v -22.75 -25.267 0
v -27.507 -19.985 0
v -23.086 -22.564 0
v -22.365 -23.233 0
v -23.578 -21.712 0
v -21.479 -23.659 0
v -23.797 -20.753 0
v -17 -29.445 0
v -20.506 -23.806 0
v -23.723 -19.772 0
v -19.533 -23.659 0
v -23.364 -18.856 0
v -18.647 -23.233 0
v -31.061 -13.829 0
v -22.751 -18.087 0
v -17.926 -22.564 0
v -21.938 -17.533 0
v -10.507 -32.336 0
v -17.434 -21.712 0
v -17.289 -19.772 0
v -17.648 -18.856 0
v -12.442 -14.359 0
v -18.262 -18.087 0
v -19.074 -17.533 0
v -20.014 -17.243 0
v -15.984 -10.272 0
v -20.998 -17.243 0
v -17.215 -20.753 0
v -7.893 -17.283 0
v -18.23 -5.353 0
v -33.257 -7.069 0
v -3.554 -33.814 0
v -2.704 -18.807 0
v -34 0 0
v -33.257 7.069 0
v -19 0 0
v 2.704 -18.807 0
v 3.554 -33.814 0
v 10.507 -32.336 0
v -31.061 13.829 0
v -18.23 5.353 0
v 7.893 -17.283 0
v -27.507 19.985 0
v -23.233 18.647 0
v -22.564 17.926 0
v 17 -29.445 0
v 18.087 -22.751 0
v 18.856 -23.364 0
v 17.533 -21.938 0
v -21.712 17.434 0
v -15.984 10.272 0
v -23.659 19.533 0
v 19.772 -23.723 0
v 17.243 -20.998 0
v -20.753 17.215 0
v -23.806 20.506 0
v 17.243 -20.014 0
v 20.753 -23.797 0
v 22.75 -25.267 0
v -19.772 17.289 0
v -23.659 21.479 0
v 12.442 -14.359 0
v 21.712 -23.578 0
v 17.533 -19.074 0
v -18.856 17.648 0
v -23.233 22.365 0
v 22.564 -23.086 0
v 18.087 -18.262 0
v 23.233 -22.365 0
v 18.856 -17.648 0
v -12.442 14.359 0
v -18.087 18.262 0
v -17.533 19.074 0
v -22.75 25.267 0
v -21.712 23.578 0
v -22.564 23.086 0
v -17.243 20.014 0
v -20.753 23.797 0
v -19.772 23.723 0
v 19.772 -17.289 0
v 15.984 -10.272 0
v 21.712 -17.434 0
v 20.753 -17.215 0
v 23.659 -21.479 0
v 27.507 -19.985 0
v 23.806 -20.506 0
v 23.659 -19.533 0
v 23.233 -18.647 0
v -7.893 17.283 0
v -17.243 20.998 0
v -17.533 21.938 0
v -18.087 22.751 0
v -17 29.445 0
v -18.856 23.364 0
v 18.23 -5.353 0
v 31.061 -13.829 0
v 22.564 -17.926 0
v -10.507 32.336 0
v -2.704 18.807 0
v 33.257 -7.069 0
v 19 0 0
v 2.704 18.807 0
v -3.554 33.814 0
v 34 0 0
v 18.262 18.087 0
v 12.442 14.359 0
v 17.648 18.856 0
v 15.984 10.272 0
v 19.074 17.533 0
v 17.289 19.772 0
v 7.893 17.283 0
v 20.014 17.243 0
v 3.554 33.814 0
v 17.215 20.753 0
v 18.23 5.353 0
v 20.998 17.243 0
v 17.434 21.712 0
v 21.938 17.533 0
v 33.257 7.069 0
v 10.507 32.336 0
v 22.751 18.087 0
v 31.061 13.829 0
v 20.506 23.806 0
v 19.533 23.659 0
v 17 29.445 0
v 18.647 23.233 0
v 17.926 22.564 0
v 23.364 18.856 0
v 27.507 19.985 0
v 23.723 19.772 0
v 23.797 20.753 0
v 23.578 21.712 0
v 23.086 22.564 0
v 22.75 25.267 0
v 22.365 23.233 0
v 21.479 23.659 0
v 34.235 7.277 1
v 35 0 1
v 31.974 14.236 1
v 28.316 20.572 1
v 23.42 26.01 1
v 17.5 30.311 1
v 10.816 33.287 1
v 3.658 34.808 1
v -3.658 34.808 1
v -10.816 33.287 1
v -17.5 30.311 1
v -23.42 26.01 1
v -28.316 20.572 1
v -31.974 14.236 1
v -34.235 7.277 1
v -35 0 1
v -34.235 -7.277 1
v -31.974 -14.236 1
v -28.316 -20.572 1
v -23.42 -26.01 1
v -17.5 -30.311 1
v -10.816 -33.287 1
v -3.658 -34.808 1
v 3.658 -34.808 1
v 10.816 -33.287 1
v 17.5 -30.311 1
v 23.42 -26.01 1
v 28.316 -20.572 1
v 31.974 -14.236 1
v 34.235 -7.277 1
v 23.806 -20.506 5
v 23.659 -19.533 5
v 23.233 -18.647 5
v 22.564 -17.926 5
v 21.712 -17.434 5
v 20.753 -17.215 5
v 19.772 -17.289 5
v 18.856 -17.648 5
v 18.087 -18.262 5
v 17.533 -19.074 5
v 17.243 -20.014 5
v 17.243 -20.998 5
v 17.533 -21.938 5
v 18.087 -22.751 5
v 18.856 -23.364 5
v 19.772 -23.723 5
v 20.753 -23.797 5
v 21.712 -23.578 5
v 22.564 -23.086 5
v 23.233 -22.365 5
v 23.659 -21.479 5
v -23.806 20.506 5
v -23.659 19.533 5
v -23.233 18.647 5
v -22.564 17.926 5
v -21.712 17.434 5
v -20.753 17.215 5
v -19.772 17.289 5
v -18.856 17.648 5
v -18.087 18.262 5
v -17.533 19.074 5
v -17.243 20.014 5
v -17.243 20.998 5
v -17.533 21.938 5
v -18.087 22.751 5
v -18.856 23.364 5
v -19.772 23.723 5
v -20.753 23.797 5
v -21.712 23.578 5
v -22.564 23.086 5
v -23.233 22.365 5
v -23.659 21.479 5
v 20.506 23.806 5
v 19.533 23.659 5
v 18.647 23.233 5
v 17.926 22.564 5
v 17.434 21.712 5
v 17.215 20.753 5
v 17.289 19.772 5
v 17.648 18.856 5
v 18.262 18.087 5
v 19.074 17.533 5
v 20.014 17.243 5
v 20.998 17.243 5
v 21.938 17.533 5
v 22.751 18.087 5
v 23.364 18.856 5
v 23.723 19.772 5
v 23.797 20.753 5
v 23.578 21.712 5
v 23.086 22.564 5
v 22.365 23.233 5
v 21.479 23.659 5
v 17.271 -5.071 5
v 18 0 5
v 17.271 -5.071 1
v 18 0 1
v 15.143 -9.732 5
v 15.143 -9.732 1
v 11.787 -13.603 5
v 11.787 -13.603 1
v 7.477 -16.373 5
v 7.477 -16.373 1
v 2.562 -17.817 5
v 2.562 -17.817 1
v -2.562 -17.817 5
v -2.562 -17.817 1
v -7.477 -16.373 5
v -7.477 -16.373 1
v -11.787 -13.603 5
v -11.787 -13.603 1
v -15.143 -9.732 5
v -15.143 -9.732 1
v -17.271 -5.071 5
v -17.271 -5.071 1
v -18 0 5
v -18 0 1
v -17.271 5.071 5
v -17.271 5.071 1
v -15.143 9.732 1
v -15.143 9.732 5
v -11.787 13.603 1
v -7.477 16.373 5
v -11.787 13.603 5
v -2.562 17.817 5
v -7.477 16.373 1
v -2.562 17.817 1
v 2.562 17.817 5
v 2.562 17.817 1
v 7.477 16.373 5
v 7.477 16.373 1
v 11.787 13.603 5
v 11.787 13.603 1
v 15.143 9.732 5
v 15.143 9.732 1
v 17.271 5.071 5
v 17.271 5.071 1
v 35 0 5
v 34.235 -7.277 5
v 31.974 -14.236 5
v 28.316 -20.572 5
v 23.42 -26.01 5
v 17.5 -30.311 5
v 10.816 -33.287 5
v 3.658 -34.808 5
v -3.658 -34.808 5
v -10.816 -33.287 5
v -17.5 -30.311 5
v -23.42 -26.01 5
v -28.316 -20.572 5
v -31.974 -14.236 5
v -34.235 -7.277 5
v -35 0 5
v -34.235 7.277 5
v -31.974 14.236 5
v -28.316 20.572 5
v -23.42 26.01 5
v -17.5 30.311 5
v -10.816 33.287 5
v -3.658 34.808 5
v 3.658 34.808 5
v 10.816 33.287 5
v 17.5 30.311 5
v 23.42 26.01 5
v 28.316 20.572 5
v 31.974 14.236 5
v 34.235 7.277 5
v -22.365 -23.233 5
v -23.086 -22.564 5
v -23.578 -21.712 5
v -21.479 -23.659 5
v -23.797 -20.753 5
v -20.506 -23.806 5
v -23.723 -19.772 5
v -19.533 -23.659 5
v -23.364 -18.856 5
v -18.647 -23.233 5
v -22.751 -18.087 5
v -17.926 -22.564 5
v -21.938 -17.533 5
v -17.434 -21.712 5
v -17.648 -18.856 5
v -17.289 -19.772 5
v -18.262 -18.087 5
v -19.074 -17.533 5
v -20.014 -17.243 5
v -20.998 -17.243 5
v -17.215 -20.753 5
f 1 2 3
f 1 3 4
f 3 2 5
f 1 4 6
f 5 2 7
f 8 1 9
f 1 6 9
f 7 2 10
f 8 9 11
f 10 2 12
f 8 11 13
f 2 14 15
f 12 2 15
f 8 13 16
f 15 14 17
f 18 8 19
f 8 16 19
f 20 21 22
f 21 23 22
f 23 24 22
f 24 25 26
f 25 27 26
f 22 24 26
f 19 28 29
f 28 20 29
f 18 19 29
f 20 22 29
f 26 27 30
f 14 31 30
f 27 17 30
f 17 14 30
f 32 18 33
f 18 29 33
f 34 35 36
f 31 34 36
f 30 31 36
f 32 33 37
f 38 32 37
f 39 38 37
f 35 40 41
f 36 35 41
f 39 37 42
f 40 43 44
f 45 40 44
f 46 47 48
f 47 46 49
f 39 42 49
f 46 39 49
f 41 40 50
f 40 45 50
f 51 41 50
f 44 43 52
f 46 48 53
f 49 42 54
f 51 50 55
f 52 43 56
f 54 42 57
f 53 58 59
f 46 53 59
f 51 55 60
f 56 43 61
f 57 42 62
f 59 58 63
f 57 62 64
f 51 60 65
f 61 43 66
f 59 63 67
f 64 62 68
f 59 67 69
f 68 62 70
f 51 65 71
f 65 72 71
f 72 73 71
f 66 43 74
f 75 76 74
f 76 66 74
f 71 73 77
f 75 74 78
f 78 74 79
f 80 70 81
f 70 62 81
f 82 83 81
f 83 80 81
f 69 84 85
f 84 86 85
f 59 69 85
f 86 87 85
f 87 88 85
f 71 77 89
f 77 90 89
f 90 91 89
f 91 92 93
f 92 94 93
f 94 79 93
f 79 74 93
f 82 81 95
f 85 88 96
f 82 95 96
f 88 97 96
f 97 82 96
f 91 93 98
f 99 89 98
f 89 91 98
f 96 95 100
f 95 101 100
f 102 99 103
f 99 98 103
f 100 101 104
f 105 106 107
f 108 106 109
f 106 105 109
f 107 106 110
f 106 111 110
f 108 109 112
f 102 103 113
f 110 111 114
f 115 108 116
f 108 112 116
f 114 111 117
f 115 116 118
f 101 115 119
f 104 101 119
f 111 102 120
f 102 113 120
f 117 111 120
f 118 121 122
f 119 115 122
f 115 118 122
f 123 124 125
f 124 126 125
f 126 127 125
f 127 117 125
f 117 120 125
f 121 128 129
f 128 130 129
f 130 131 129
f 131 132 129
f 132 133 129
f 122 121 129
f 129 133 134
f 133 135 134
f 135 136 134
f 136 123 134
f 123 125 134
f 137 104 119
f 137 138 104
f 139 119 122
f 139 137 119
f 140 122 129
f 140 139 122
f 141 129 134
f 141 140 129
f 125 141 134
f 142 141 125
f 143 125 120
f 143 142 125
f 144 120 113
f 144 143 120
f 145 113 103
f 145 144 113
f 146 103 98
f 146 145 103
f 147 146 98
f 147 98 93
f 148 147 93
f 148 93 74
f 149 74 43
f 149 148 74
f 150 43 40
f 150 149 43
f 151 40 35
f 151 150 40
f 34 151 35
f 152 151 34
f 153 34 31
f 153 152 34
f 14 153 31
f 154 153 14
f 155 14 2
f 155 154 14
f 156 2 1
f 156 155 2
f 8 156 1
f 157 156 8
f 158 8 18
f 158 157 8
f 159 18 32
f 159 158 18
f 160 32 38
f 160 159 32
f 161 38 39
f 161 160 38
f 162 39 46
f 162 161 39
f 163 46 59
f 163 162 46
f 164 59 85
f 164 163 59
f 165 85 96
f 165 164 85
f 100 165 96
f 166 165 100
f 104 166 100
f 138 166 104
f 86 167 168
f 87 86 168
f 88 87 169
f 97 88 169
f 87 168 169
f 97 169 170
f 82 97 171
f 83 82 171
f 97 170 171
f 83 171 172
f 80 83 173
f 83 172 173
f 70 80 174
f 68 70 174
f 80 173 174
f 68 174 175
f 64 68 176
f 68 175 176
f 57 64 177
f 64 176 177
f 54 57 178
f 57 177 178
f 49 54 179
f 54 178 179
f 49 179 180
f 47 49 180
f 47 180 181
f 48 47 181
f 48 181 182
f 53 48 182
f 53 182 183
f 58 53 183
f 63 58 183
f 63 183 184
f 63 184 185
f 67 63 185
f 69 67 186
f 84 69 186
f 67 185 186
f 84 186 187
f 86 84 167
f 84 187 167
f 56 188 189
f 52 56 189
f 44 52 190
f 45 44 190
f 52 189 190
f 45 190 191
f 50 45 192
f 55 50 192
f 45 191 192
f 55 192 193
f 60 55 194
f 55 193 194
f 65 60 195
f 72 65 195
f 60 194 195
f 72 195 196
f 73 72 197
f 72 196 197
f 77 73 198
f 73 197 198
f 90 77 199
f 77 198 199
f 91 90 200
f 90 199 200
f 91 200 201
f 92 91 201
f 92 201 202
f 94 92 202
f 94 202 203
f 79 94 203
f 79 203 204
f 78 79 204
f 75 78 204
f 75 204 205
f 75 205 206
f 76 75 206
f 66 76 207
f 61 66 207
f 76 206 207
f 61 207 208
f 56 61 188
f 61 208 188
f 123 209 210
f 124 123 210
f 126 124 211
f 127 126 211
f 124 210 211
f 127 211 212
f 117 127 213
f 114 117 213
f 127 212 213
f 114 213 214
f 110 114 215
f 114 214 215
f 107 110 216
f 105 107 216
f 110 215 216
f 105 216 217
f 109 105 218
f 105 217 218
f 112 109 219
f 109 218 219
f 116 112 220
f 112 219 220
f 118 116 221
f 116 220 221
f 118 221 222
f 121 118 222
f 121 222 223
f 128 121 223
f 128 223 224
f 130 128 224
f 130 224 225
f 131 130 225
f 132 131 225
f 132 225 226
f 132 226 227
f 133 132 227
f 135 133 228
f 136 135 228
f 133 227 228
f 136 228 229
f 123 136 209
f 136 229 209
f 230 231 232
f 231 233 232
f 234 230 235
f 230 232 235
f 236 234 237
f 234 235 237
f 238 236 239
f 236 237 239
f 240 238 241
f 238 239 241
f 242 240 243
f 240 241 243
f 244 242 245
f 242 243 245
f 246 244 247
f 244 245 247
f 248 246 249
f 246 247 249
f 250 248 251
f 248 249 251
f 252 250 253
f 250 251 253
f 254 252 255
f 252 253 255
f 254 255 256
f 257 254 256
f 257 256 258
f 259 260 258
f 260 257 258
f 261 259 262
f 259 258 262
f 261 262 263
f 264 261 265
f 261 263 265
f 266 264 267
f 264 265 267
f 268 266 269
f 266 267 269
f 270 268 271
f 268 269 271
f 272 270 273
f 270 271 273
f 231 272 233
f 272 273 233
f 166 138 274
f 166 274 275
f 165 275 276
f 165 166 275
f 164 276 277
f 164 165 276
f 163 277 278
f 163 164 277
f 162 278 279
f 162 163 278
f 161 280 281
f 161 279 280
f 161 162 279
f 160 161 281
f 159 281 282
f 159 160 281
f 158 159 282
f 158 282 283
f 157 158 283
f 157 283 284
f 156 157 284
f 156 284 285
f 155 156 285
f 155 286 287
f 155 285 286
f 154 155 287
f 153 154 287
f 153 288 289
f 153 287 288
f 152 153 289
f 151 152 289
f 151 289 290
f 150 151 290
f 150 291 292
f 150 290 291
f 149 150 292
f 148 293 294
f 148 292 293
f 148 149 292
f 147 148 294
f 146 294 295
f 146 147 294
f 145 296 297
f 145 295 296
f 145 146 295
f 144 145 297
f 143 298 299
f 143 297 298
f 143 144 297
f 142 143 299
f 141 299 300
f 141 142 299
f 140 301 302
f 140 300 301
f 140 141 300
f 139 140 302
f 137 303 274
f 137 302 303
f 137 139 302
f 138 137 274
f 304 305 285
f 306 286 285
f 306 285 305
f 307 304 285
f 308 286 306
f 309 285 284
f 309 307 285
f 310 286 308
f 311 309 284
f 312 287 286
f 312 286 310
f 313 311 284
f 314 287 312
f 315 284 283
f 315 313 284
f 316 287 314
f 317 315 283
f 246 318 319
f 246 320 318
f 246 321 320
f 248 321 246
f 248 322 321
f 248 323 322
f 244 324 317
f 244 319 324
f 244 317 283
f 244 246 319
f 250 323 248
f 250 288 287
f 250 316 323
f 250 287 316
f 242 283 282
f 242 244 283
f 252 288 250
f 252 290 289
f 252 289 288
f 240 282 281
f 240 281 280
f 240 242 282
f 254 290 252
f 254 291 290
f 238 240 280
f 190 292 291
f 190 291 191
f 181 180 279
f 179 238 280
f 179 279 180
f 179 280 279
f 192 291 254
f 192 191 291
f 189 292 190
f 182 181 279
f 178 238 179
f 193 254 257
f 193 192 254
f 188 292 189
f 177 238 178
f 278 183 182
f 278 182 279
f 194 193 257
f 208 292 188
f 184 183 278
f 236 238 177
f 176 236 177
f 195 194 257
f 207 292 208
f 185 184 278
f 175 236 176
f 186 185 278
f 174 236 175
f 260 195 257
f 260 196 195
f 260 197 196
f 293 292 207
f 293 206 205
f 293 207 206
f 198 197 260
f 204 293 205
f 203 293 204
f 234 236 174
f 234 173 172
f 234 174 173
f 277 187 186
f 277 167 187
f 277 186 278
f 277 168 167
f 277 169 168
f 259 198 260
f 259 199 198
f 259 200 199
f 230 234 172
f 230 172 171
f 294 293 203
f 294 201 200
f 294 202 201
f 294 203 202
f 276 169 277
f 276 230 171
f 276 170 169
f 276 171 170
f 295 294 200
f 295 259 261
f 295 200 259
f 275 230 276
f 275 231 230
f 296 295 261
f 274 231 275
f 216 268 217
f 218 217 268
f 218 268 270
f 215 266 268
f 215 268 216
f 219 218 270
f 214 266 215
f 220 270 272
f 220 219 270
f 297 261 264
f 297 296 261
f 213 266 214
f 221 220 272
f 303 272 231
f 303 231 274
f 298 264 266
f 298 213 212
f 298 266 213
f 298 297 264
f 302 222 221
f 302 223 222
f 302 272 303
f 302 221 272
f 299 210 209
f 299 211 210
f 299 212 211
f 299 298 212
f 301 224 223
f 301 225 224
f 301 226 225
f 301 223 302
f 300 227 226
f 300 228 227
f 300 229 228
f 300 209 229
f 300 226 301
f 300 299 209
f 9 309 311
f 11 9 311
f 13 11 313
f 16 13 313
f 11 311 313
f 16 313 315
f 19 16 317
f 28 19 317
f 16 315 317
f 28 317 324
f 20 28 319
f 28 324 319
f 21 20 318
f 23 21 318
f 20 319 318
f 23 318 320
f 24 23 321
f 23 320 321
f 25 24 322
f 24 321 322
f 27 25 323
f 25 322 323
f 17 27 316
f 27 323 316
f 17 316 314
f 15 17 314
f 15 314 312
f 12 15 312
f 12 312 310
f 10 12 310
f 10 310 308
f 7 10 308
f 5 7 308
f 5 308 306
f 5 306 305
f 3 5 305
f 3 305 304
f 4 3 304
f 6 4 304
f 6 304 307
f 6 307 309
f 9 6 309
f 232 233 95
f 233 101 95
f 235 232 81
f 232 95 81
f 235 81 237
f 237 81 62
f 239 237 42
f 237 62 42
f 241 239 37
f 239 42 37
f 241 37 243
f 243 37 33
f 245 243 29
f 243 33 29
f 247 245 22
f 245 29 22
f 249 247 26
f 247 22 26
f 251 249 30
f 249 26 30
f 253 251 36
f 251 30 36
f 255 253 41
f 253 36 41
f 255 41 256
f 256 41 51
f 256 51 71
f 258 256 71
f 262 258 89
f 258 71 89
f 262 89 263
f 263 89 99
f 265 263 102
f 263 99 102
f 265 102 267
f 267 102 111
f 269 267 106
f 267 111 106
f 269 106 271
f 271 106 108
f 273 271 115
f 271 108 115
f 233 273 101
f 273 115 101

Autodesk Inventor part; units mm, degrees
ref_plane "YZ Plane" through (0, 0, 0) normal (1, 0, 0) x (0, 1, 0)
ref_plane "XZ Plane" through (0, 0, 0) normal (0, 1, 0) x (-1, 0, 0)
ref_plane "XY Plane" through (0, 0, 0) normal (0, 0, 1) x (1, 0, 0)
sketch "Sketch1" plane through (0, 0, 0) normal (0, 0, 1) x (1, 0, 0)
  circle A0 centre (0, 0) radius 35
  circle A1 centre (0, 0) radius 18
  circle A2 centre (0, 0) radius 29 construction
  line L0 (0, 0) -> (0, 29) construction
  line L1 (0, 0) -> (20.5061, 20.5061) construction
  dimension "d0" = 70
  dimension "d1" = 36
  dimension "d2" = 58
  dimension "d3" = 45
extrude "Extrusion1" add sketch "Sketch1" along normal blind 5
hole "Hole1" at (20.5061, 20.5061, 0) direction (0, 0, 1) diameter 6.6 end through all clearance for "Countersunk Flat Head Screw ISO 2009/7046" size "M6" standard "ISO"
pattern_circular "Circular Pattern1" count 4 over 360 about axis through (0, 0, -10) along (0, 0, 1) of "Hole1"
chamfer "Chamfer1" distance 1 angle 45 2 edges at (-18, 0, 0) (-35, 0, 0)
properties part number "PWTR-0051"
